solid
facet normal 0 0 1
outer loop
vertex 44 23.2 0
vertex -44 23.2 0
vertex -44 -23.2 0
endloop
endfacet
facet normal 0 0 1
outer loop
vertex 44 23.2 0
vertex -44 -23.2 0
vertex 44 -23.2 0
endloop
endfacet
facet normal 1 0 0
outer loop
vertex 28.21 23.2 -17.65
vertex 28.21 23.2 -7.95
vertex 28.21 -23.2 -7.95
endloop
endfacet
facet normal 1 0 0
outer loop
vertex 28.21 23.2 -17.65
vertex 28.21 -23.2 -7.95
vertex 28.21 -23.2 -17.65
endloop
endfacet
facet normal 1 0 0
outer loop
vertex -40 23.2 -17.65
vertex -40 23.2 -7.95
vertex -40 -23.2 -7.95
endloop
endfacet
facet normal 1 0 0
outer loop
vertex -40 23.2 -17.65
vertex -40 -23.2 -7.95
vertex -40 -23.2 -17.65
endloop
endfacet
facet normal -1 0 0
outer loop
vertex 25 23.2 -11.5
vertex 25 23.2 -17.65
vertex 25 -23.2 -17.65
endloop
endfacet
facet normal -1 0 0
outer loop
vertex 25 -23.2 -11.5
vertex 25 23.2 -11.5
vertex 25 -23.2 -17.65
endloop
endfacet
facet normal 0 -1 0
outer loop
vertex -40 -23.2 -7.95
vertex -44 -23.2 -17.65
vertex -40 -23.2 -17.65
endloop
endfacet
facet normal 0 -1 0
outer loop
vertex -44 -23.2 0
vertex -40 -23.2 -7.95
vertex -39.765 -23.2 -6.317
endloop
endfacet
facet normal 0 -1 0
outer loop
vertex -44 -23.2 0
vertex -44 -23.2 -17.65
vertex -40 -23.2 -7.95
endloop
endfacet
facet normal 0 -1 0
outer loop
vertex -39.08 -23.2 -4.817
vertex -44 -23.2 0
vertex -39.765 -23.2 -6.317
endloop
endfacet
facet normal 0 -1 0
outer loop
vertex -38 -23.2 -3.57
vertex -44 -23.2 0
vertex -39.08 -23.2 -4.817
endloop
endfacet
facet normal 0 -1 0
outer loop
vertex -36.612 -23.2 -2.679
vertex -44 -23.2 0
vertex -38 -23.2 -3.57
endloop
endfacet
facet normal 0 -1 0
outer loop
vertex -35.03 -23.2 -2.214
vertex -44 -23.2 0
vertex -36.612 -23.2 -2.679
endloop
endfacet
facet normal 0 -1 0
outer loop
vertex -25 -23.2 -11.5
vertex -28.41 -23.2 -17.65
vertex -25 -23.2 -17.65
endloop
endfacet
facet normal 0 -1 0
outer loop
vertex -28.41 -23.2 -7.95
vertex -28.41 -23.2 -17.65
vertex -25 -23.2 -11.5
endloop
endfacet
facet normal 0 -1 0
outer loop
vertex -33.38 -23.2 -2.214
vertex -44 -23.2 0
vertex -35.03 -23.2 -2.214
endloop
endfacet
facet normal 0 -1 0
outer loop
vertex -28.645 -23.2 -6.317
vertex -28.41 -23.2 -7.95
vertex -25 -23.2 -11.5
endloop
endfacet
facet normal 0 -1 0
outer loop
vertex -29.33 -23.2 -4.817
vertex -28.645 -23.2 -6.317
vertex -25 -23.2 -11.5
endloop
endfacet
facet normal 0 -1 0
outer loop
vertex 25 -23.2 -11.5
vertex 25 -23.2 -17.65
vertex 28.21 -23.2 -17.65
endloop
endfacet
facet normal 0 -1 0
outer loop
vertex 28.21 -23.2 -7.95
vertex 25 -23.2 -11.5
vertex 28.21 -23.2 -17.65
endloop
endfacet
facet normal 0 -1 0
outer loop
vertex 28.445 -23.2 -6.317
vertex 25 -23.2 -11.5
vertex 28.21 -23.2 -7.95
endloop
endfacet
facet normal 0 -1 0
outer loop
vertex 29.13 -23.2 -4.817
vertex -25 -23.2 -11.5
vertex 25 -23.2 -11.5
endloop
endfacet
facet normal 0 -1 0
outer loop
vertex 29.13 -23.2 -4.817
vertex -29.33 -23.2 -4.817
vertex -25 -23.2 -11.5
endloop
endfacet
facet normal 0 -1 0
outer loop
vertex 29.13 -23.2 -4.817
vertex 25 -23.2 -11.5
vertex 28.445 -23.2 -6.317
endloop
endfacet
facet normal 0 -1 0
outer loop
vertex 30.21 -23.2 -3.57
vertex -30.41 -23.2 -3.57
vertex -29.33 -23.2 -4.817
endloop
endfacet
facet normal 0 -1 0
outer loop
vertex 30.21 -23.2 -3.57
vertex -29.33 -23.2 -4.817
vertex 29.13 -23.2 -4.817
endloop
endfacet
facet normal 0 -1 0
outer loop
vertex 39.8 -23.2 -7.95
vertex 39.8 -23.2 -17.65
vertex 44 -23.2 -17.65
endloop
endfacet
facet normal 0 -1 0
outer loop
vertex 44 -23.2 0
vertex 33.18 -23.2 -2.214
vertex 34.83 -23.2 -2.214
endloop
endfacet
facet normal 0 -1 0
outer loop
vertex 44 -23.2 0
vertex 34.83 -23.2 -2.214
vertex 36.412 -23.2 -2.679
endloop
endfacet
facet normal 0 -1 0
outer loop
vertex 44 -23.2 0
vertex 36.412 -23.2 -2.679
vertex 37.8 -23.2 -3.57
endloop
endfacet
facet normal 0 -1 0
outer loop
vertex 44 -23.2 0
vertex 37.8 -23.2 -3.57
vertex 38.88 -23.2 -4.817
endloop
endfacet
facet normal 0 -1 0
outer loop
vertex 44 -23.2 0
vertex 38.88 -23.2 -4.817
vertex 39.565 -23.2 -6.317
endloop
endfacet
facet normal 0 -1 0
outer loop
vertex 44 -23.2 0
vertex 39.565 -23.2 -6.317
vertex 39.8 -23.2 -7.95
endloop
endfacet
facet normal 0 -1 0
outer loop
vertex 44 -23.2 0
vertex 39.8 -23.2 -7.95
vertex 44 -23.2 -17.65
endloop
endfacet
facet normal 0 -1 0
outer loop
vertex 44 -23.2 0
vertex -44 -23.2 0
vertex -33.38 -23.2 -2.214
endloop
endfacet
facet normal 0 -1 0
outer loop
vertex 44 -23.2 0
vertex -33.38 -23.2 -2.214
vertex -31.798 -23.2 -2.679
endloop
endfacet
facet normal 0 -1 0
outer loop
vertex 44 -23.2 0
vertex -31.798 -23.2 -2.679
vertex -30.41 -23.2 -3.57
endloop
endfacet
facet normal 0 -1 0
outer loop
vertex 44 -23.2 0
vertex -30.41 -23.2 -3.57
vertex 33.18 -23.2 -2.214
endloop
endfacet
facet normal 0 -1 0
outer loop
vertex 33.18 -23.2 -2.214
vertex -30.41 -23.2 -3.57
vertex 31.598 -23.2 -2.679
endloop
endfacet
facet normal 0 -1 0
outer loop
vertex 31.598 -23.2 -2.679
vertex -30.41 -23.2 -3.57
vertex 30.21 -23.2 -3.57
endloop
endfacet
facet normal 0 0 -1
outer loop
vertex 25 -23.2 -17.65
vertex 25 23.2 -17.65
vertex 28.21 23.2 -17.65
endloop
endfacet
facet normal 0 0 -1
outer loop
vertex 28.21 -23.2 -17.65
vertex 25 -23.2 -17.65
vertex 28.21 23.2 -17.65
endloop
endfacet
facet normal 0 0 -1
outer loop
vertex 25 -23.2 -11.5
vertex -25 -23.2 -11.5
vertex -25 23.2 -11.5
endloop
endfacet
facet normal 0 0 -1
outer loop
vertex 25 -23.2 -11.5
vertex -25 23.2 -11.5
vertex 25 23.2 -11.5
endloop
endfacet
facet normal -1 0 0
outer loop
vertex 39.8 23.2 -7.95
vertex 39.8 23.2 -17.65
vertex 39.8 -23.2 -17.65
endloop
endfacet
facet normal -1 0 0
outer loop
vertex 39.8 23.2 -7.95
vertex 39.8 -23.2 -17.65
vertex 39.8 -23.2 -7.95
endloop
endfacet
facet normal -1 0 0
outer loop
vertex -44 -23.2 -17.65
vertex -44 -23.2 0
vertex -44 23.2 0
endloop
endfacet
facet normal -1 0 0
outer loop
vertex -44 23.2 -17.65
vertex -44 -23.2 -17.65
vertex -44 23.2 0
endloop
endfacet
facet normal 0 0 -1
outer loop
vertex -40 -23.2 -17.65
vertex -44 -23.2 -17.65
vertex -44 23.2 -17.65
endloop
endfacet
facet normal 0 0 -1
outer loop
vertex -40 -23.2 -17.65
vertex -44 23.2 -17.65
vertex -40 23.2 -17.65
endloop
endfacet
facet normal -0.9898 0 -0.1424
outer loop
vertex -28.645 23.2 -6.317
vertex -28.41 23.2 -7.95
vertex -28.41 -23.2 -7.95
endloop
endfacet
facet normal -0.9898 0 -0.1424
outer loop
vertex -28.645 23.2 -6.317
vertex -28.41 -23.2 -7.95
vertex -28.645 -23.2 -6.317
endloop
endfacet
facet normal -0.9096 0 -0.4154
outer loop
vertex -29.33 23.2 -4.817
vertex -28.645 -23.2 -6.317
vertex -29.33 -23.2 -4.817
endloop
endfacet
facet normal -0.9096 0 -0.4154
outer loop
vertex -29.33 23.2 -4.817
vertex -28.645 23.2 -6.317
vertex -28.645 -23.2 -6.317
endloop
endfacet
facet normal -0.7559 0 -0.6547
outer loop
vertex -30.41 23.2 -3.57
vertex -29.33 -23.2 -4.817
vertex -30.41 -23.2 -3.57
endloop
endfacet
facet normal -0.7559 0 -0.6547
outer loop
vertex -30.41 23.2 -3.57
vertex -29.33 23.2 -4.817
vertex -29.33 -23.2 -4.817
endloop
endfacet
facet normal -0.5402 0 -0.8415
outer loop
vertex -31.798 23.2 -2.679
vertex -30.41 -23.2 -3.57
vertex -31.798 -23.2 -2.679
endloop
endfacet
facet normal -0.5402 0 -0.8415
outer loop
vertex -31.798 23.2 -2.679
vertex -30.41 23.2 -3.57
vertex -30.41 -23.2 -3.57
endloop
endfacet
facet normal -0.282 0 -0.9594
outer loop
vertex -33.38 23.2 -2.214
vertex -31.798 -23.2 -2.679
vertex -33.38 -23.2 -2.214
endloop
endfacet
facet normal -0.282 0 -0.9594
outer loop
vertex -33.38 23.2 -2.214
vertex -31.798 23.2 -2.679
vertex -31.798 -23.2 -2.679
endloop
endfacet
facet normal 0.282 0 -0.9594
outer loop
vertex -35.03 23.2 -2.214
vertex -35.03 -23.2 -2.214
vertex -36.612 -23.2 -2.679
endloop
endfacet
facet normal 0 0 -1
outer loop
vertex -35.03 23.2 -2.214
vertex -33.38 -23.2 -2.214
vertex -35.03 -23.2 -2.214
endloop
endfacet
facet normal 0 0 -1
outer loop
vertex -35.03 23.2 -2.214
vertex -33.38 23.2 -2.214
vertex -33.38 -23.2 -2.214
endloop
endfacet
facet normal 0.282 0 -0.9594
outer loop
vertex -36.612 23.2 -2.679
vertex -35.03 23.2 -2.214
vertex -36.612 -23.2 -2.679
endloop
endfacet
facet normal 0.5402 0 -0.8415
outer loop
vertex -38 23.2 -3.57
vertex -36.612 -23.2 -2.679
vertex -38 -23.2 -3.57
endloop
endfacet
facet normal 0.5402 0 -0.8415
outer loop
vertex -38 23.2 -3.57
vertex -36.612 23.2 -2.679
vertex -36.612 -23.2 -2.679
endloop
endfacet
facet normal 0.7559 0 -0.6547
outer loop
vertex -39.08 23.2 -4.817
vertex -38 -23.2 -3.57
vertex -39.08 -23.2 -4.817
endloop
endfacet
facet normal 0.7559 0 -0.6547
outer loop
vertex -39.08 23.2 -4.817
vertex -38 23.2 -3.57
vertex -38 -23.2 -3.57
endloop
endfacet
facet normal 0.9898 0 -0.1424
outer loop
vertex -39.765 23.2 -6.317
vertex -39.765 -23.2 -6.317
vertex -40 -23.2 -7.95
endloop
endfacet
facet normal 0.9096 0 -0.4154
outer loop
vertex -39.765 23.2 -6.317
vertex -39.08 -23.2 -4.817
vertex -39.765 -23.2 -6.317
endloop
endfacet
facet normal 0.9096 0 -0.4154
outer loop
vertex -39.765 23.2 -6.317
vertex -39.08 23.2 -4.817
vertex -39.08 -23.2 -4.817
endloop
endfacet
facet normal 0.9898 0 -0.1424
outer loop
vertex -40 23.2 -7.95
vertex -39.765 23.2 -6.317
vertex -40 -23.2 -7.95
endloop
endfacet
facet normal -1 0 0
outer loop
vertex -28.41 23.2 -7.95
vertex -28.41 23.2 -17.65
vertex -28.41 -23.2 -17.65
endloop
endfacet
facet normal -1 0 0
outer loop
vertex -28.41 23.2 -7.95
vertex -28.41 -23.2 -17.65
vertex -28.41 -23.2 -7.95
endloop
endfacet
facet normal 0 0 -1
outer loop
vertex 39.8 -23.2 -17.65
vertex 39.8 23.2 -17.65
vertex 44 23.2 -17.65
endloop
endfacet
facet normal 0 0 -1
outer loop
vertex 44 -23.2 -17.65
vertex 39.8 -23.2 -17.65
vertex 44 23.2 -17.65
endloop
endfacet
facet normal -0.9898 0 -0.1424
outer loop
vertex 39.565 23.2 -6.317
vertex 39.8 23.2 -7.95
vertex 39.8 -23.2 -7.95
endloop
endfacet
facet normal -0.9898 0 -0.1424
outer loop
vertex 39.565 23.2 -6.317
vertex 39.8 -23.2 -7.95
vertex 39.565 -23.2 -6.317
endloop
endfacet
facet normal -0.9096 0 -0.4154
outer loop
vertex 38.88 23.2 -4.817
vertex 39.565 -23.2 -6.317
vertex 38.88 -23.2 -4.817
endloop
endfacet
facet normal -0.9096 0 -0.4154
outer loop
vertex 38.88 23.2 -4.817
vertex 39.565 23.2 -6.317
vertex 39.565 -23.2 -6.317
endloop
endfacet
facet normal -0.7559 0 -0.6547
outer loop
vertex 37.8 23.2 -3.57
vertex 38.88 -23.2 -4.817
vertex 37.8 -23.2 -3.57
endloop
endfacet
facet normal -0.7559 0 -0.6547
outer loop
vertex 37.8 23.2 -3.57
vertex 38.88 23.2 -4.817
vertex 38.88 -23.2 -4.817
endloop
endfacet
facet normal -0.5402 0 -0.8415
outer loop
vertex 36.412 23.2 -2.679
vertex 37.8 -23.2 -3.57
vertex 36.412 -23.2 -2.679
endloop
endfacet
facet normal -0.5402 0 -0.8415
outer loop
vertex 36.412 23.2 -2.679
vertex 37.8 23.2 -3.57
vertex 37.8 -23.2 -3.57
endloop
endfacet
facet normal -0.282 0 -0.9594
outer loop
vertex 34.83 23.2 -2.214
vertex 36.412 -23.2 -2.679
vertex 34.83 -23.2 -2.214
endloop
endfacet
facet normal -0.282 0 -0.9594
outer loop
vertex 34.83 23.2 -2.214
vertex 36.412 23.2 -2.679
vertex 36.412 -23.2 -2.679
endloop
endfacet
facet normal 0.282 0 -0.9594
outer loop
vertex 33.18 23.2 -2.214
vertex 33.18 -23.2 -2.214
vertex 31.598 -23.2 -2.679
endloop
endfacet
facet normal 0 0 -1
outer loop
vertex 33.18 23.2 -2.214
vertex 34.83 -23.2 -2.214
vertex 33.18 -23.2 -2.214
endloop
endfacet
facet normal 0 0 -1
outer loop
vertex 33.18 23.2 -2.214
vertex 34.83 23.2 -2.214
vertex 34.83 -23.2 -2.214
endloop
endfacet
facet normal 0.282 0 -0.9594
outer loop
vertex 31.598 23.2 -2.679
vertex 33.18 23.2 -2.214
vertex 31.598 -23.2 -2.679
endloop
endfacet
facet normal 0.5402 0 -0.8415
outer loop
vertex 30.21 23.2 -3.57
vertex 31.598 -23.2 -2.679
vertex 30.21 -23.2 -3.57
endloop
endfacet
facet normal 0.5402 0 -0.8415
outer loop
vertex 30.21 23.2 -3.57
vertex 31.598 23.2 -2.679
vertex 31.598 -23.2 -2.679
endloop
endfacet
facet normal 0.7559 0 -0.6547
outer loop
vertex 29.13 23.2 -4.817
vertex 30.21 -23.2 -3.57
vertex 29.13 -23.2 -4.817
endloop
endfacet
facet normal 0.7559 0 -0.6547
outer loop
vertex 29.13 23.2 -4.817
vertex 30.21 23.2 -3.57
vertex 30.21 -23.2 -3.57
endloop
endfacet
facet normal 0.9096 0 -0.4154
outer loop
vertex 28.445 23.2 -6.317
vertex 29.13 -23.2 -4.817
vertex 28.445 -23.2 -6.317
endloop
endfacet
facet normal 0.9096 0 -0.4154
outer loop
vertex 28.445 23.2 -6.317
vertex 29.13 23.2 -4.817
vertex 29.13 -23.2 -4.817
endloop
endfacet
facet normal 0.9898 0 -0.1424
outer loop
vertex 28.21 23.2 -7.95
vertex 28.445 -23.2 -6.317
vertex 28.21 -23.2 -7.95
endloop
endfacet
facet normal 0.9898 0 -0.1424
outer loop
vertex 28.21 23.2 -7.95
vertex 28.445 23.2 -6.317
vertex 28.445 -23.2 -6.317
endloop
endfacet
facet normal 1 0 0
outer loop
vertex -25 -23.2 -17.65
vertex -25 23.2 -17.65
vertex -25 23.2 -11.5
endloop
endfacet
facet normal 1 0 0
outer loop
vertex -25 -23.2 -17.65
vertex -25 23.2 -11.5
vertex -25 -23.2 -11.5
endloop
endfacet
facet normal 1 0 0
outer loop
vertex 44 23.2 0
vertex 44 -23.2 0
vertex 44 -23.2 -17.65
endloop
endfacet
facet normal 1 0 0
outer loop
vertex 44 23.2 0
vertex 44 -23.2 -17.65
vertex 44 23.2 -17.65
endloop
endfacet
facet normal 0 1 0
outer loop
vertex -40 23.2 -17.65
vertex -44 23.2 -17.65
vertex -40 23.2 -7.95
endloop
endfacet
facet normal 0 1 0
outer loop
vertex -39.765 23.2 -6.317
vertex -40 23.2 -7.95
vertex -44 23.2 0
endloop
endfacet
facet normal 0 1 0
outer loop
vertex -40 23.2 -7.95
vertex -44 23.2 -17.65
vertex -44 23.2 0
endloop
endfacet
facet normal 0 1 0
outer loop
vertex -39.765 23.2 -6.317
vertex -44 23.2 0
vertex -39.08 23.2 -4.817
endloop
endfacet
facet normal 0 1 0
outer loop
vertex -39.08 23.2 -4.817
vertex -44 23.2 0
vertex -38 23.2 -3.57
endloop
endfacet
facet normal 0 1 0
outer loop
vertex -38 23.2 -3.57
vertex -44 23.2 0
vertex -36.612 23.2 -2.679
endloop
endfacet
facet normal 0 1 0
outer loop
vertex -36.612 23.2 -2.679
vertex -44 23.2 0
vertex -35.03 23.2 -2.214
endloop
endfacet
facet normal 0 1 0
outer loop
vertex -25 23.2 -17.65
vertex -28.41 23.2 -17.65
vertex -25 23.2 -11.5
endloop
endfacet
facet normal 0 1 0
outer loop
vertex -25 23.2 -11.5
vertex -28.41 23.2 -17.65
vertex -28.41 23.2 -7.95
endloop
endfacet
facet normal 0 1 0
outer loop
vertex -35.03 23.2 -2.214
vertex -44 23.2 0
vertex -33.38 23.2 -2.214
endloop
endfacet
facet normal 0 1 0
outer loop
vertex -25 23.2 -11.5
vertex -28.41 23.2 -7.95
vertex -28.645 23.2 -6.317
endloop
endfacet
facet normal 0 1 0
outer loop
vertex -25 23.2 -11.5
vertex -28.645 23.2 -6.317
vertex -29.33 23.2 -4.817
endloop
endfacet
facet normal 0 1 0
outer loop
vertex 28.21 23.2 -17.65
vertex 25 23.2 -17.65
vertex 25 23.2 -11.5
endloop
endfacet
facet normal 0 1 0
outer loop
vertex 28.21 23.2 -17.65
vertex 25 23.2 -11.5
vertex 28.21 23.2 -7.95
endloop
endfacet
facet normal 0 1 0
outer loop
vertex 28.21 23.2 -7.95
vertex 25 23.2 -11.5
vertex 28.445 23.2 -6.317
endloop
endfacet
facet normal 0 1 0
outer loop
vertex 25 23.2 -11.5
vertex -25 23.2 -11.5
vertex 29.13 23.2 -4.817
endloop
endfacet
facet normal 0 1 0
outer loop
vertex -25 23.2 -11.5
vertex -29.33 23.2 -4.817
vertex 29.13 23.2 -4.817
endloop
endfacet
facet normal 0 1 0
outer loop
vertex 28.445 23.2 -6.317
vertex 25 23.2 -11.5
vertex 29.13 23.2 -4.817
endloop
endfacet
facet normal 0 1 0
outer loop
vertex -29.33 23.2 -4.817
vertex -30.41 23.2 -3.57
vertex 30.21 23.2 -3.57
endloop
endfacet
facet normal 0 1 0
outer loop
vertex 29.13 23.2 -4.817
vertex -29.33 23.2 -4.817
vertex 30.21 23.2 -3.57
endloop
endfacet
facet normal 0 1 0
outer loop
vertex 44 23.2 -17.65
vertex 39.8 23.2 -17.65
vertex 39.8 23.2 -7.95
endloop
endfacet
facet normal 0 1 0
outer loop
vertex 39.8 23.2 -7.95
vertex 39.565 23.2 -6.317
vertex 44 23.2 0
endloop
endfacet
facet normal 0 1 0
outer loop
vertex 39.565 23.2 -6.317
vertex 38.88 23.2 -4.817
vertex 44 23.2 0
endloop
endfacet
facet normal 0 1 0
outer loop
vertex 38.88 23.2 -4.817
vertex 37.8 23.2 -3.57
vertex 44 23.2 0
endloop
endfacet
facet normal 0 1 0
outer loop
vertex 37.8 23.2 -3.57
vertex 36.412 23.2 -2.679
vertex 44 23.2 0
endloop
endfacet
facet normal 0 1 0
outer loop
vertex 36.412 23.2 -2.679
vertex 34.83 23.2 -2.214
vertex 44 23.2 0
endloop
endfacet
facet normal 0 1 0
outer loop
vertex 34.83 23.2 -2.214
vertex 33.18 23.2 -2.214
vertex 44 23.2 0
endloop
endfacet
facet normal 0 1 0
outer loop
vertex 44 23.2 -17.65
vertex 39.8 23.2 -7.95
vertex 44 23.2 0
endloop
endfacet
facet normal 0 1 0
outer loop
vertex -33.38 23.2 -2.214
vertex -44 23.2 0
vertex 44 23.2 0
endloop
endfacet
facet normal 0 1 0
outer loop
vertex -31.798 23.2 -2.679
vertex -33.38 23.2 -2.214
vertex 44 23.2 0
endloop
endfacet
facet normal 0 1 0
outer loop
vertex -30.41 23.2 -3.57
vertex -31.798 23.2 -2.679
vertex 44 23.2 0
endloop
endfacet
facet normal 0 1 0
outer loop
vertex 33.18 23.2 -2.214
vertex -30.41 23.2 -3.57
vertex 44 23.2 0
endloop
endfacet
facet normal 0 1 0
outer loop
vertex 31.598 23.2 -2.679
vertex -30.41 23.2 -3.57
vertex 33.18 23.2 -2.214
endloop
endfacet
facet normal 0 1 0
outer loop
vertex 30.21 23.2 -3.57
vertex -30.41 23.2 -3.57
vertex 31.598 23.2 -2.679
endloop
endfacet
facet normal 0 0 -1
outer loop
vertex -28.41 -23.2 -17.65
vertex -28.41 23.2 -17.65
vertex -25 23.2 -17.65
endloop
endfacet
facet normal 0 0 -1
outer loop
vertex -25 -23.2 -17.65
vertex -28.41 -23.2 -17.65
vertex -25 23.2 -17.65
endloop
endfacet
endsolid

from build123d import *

# Parameters (mm, degrees)
F0_W          = 88
F0_H          = 46.4
F1_DEPTH      = 17.65
F2_W          = 50
F2_H          = 46.4
F3_DEPTH      = 6.15
F5_DEPTH      = 23.201
F5_DEPTH_BACK = 23.201


with BuildPart() as f1:
    # F0 (on Top) → F1 (new body)
    with BuildSketch(Plane.XY):
        Rectangle(F0_W, F0_H)
    extrude(amount=-F1_DEPTH)

    # F2 (on face) → F3 (cut)
    with BuildSketch(Plane(origin=(0, 0, -17.65), x_dir=(1, 0, 0), z_dir=(0, 0, -1))):
        Rectangle(F2_W, F2_H)
    extrude(amount=-F3_DEPTH, mode=Mode.SUBTRACT)

    # F4 (on Front) → F5 (cut, two sides)
    with BuildSketch(Plane.XZ) as f5_sk:
        with BuildLine():
            Line((-40, -7.95), (-40, -17.65))
            Line((-40, -17.65), (-28.41, -17.65))
            Line((-28.41, -17.65), (-28.41, -7.95))
            ThreePointArc((-28.41, -7.95), (-34.205, -2.155), (-40, -7.95))
        make_face()
        with BuildLine():
            Line((28.21, -7.95), (28.21, -17.65))
            Line((28.21, -17.65), (39.8, -17.65))
            Line((39.8, -17.65), (39.8, -7.95))
            ThreePointArc((39.8, -7.95), (34.005, -2.155), (28.21, -7.95))
        make_face()
    extrude(amount=-F5_DEPTH, mode=Mode.SUBTRACT)
    extrude(f5_sk.sketch, amount=F5_DEPTH_BACK, mode=Mode.SUBTRACT)


solid = f1.part
